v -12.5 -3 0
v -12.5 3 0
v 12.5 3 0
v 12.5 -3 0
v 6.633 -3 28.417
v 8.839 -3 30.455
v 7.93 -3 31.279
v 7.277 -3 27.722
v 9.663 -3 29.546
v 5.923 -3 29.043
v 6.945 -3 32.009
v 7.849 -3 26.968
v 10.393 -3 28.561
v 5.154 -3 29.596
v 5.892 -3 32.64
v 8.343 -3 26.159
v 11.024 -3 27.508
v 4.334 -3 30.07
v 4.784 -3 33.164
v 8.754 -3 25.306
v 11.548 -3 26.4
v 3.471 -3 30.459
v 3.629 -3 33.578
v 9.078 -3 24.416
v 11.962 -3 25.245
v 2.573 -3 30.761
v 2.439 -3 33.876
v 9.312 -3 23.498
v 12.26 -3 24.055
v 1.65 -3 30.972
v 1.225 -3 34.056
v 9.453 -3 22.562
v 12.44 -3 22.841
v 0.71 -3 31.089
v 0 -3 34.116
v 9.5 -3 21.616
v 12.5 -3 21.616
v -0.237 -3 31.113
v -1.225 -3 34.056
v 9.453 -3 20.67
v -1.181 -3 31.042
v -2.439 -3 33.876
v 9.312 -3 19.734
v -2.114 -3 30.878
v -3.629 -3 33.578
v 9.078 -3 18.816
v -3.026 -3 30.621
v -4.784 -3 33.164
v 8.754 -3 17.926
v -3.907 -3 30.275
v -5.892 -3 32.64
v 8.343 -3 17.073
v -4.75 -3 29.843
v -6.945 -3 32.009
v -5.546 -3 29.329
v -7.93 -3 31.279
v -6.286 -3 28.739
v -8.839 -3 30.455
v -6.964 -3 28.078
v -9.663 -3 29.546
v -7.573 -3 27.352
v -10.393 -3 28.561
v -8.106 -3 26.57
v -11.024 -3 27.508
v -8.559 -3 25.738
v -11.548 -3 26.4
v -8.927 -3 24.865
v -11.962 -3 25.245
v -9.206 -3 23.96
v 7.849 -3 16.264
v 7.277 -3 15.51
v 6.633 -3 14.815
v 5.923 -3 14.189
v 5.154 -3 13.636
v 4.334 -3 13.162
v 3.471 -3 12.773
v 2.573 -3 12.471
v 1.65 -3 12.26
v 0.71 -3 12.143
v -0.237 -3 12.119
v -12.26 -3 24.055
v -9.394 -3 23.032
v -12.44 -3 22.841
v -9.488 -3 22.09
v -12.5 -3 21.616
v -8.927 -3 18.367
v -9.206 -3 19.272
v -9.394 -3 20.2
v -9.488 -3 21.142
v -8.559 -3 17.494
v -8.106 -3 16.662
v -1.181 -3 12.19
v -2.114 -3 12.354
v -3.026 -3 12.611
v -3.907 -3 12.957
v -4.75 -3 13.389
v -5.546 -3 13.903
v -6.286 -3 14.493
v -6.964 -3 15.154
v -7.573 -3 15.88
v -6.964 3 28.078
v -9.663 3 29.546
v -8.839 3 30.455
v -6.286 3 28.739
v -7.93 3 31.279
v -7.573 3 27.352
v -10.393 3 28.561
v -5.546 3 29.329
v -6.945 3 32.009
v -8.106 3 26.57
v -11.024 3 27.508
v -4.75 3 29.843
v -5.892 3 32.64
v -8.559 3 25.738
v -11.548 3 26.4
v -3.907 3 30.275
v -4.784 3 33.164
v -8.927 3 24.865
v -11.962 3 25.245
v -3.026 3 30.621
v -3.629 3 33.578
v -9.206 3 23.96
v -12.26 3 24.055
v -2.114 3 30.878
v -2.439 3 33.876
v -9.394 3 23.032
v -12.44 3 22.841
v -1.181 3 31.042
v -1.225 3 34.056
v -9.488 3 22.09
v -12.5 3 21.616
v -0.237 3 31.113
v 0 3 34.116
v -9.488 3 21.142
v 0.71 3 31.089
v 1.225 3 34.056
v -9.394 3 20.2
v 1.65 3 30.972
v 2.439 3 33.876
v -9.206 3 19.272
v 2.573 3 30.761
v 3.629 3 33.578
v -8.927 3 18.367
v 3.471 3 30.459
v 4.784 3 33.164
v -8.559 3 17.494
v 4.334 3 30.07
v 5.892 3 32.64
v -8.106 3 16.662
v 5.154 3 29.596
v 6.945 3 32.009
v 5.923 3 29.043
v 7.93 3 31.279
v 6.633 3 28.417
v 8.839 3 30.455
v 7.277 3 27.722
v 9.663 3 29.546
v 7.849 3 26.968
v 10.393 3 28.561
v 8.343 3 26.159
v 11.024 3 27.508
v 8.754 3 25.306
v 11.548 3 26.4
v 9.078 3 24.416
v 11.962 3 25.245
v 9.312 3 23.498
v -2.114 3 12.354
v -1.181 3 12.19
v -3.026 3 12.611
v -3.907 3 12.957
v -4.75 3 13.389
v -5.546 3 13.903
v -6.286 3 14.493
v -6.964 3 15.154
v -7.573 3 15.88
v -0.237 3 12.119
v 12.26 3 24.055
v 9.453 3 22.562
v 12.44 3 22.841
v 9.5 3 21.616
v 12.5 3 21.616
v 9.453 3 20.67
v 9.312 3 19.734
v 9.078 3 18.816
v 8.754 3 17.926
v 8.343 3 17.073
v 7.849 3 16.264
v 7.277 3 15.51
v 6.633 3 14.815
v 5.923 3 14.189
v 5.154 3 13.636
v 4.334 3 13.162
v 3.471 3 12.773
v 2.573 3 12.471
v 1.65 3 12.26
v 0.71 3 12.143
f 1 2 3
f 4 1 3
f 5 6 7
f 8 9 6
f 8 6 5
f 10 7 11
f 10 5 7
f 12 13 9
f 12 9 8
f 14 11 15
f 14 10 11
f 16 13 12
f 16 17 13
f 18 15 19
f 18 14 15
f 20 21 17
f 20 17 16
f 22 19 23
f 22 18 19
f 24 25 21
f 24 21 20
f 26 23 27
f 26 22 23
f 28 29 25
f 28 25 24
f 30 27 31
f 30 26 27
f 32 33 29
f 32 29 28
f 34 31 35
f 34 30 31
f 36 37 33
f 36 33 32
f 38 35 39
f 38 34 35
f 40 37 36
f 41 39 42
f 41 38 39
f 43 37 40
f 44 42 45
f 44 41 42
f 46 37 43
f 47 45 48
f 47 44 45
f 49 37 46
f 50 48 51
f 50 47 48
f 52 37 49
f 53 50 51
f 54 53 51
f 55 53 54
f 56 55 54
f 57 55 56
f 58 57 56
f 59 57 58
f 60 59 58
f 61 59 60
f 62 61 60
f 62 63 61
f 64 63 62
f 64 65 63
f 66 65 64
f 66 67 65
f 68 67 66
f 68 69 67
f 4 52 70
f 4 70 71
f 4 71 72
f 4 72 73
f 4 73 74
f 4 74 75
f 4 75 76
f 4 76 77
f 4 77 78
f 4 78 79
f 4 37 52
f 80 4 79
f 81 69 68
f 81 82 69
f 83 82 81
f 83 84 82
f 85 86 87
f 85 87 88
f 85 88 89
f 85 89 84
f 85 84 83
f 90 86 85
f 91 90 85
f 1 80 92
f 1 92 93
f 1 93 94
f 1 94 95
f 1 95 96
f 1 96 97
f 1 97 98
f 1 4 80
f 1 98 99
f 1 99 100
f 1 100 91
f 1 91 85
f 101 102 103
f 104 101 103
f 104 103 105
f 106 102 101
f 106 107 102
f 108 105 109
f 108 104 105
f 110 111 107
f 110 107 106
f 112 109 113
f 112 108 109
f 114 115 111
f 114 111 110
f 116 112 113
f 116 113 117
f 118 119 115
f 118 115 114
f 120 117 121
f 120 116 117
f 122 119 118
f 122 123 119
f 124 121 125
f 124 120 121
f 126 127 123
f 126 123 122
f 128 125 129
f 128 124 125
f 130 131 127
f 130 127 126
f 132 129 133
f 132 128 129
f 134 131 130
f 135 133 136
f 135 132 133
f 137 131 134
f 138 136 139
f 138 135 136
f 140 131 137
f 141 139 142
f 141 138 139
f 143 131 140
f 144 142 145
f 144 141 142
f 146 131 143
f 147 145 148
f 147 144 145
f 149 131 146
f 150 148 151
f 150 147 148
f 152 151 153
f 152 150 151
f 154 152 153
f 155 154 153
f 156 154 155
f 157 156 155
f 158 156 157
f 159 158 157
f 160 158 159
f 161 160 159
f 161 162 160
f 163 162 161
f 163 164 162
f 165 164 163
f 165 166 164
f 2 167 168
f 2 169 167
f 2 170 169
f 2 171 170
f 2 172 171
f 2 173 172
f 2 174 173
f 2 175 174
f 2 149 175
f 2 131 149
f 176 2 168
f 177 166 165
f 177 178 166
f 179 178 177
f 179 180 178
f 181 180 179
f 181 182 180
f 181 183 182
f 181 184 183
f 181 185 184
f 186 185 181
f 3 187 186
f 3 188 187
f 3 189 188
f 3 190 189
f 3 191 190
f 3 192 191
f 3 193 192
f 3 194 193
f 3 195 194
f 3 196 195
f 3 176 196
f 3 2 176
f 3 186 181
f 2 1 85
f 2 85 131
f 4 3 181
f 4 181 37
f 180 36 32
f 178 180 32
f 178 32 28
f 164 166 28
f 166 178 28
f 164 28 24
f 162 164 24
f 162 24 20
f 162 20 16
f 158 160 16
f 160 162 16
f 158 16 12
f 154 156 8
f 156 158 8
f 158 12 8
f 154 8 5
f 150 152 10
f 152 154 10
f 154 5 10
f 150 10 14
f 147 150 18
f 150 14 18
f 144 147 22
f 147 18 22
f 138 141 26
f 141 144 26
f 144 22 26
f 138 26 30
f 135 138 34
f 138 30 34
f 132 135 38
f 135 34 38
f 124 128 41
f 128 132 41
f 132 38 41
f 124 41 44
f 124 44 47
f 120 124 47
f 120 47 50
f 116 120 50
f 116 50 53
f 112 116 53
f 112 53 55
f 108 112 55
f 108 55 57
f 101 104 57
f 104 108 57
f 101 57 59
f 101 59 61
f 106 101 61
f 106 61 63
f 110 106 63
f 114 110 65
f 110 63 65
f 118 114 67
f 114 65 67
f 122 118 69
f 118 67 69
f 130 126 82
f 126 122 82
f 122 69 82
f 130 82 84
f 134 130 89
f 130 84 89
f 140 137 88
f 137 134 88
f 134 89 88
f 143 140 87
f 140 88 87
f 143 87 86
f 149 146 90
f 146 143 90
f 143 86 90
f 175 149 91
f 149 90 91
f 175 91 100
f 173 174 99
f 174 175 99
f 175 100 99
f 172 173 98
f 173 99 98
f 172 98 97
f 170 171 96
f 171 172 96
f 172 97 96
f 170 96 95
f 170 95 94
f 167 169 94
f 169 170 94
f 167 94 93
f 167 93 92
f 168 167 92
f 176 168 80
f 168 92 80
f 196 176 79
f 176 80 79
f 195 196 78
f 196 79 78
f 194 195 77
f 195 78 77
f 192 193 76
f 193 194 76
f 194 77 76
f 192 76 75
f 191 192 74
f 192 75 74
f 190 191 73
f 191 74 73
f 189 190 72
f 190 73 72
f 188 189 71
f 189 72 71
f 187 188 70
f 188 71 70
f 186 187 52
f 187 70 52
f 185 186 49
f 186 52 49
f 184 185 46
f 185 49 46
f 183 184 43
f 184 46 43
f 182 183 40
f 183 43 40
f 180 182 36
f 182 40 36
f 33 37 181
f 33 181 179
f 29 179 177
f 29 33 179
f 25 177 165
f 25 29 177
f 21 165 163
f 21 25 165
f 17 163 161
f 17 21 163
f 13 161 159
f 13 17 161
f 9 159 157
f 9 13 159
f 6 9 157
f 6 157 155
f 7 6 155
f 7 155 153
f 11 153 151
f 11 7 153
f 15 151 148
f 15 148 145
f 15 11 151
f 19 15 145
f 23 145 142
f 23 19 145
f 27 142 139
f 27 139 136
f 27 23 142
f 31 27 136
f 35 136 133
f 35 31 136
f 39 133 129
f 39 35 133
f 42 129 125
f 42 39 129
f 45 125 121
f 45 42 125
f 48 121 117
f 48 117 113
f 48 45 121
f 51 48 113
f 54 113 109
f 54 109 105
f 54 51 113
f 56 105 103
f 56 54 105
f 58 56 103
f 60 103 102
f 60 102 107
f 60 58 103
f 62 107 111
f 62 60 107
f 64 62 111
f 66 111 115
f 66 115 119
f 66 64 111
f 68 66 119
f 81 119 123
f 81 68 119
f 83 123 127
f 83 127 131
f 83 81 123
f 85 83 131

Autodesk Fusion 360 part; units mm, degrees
sketch "Sketch1" plane through (0, 0, 0) normal (0, 0, 1) x (1, 0, 0)
  line L0 (12.5, -3) -> (-12.5, -3)
  line L1 (-12.5, -3) -> (-12.5, 3)
  line L2 (-12.5, 3) -> (12.5, 3)
  line L3 (12.5, 3) -> (12.5, -3)
  line L4 (12.5, -3) -> (-12.5, 3) construction
  line L5 (-12.5, -3) -> (12.5, 3) construction
  dimension "d1" = 6
  dimension "d2" = 25
extrude "Extrude1" add sketch "Sketch1" along normal blind 21.616
sketch "Sketch2" plane through (0, -3, 0) normal (0, -1, 0) x (1, 0, 0)
  line L0 (-12.5, 0) -> (12.5, 0)
  line L1 (12.5, 0) -> (12.5, 21.616)
  line L2 (12.5, 21.616) -> (-12.5, 21.616)
  line L3 (-12.5, 21.616) -> (-12.5, 0)
  circle A0 centre (0, 21.616) radius 12.5
  circle A1 centre (0, 21.616) radius 9.5
  dimension "d5" = 19
extrude "Extrude2" add sketch "Sketch2" against normal blind 6 contours L2 A0 A1 picked at (-11.4535, 22.237)
extrude "Extrude3" cut sketch "Sketch2" against normal blind 6 contours L2 A1 picked at (0.2366, 18.4582)
